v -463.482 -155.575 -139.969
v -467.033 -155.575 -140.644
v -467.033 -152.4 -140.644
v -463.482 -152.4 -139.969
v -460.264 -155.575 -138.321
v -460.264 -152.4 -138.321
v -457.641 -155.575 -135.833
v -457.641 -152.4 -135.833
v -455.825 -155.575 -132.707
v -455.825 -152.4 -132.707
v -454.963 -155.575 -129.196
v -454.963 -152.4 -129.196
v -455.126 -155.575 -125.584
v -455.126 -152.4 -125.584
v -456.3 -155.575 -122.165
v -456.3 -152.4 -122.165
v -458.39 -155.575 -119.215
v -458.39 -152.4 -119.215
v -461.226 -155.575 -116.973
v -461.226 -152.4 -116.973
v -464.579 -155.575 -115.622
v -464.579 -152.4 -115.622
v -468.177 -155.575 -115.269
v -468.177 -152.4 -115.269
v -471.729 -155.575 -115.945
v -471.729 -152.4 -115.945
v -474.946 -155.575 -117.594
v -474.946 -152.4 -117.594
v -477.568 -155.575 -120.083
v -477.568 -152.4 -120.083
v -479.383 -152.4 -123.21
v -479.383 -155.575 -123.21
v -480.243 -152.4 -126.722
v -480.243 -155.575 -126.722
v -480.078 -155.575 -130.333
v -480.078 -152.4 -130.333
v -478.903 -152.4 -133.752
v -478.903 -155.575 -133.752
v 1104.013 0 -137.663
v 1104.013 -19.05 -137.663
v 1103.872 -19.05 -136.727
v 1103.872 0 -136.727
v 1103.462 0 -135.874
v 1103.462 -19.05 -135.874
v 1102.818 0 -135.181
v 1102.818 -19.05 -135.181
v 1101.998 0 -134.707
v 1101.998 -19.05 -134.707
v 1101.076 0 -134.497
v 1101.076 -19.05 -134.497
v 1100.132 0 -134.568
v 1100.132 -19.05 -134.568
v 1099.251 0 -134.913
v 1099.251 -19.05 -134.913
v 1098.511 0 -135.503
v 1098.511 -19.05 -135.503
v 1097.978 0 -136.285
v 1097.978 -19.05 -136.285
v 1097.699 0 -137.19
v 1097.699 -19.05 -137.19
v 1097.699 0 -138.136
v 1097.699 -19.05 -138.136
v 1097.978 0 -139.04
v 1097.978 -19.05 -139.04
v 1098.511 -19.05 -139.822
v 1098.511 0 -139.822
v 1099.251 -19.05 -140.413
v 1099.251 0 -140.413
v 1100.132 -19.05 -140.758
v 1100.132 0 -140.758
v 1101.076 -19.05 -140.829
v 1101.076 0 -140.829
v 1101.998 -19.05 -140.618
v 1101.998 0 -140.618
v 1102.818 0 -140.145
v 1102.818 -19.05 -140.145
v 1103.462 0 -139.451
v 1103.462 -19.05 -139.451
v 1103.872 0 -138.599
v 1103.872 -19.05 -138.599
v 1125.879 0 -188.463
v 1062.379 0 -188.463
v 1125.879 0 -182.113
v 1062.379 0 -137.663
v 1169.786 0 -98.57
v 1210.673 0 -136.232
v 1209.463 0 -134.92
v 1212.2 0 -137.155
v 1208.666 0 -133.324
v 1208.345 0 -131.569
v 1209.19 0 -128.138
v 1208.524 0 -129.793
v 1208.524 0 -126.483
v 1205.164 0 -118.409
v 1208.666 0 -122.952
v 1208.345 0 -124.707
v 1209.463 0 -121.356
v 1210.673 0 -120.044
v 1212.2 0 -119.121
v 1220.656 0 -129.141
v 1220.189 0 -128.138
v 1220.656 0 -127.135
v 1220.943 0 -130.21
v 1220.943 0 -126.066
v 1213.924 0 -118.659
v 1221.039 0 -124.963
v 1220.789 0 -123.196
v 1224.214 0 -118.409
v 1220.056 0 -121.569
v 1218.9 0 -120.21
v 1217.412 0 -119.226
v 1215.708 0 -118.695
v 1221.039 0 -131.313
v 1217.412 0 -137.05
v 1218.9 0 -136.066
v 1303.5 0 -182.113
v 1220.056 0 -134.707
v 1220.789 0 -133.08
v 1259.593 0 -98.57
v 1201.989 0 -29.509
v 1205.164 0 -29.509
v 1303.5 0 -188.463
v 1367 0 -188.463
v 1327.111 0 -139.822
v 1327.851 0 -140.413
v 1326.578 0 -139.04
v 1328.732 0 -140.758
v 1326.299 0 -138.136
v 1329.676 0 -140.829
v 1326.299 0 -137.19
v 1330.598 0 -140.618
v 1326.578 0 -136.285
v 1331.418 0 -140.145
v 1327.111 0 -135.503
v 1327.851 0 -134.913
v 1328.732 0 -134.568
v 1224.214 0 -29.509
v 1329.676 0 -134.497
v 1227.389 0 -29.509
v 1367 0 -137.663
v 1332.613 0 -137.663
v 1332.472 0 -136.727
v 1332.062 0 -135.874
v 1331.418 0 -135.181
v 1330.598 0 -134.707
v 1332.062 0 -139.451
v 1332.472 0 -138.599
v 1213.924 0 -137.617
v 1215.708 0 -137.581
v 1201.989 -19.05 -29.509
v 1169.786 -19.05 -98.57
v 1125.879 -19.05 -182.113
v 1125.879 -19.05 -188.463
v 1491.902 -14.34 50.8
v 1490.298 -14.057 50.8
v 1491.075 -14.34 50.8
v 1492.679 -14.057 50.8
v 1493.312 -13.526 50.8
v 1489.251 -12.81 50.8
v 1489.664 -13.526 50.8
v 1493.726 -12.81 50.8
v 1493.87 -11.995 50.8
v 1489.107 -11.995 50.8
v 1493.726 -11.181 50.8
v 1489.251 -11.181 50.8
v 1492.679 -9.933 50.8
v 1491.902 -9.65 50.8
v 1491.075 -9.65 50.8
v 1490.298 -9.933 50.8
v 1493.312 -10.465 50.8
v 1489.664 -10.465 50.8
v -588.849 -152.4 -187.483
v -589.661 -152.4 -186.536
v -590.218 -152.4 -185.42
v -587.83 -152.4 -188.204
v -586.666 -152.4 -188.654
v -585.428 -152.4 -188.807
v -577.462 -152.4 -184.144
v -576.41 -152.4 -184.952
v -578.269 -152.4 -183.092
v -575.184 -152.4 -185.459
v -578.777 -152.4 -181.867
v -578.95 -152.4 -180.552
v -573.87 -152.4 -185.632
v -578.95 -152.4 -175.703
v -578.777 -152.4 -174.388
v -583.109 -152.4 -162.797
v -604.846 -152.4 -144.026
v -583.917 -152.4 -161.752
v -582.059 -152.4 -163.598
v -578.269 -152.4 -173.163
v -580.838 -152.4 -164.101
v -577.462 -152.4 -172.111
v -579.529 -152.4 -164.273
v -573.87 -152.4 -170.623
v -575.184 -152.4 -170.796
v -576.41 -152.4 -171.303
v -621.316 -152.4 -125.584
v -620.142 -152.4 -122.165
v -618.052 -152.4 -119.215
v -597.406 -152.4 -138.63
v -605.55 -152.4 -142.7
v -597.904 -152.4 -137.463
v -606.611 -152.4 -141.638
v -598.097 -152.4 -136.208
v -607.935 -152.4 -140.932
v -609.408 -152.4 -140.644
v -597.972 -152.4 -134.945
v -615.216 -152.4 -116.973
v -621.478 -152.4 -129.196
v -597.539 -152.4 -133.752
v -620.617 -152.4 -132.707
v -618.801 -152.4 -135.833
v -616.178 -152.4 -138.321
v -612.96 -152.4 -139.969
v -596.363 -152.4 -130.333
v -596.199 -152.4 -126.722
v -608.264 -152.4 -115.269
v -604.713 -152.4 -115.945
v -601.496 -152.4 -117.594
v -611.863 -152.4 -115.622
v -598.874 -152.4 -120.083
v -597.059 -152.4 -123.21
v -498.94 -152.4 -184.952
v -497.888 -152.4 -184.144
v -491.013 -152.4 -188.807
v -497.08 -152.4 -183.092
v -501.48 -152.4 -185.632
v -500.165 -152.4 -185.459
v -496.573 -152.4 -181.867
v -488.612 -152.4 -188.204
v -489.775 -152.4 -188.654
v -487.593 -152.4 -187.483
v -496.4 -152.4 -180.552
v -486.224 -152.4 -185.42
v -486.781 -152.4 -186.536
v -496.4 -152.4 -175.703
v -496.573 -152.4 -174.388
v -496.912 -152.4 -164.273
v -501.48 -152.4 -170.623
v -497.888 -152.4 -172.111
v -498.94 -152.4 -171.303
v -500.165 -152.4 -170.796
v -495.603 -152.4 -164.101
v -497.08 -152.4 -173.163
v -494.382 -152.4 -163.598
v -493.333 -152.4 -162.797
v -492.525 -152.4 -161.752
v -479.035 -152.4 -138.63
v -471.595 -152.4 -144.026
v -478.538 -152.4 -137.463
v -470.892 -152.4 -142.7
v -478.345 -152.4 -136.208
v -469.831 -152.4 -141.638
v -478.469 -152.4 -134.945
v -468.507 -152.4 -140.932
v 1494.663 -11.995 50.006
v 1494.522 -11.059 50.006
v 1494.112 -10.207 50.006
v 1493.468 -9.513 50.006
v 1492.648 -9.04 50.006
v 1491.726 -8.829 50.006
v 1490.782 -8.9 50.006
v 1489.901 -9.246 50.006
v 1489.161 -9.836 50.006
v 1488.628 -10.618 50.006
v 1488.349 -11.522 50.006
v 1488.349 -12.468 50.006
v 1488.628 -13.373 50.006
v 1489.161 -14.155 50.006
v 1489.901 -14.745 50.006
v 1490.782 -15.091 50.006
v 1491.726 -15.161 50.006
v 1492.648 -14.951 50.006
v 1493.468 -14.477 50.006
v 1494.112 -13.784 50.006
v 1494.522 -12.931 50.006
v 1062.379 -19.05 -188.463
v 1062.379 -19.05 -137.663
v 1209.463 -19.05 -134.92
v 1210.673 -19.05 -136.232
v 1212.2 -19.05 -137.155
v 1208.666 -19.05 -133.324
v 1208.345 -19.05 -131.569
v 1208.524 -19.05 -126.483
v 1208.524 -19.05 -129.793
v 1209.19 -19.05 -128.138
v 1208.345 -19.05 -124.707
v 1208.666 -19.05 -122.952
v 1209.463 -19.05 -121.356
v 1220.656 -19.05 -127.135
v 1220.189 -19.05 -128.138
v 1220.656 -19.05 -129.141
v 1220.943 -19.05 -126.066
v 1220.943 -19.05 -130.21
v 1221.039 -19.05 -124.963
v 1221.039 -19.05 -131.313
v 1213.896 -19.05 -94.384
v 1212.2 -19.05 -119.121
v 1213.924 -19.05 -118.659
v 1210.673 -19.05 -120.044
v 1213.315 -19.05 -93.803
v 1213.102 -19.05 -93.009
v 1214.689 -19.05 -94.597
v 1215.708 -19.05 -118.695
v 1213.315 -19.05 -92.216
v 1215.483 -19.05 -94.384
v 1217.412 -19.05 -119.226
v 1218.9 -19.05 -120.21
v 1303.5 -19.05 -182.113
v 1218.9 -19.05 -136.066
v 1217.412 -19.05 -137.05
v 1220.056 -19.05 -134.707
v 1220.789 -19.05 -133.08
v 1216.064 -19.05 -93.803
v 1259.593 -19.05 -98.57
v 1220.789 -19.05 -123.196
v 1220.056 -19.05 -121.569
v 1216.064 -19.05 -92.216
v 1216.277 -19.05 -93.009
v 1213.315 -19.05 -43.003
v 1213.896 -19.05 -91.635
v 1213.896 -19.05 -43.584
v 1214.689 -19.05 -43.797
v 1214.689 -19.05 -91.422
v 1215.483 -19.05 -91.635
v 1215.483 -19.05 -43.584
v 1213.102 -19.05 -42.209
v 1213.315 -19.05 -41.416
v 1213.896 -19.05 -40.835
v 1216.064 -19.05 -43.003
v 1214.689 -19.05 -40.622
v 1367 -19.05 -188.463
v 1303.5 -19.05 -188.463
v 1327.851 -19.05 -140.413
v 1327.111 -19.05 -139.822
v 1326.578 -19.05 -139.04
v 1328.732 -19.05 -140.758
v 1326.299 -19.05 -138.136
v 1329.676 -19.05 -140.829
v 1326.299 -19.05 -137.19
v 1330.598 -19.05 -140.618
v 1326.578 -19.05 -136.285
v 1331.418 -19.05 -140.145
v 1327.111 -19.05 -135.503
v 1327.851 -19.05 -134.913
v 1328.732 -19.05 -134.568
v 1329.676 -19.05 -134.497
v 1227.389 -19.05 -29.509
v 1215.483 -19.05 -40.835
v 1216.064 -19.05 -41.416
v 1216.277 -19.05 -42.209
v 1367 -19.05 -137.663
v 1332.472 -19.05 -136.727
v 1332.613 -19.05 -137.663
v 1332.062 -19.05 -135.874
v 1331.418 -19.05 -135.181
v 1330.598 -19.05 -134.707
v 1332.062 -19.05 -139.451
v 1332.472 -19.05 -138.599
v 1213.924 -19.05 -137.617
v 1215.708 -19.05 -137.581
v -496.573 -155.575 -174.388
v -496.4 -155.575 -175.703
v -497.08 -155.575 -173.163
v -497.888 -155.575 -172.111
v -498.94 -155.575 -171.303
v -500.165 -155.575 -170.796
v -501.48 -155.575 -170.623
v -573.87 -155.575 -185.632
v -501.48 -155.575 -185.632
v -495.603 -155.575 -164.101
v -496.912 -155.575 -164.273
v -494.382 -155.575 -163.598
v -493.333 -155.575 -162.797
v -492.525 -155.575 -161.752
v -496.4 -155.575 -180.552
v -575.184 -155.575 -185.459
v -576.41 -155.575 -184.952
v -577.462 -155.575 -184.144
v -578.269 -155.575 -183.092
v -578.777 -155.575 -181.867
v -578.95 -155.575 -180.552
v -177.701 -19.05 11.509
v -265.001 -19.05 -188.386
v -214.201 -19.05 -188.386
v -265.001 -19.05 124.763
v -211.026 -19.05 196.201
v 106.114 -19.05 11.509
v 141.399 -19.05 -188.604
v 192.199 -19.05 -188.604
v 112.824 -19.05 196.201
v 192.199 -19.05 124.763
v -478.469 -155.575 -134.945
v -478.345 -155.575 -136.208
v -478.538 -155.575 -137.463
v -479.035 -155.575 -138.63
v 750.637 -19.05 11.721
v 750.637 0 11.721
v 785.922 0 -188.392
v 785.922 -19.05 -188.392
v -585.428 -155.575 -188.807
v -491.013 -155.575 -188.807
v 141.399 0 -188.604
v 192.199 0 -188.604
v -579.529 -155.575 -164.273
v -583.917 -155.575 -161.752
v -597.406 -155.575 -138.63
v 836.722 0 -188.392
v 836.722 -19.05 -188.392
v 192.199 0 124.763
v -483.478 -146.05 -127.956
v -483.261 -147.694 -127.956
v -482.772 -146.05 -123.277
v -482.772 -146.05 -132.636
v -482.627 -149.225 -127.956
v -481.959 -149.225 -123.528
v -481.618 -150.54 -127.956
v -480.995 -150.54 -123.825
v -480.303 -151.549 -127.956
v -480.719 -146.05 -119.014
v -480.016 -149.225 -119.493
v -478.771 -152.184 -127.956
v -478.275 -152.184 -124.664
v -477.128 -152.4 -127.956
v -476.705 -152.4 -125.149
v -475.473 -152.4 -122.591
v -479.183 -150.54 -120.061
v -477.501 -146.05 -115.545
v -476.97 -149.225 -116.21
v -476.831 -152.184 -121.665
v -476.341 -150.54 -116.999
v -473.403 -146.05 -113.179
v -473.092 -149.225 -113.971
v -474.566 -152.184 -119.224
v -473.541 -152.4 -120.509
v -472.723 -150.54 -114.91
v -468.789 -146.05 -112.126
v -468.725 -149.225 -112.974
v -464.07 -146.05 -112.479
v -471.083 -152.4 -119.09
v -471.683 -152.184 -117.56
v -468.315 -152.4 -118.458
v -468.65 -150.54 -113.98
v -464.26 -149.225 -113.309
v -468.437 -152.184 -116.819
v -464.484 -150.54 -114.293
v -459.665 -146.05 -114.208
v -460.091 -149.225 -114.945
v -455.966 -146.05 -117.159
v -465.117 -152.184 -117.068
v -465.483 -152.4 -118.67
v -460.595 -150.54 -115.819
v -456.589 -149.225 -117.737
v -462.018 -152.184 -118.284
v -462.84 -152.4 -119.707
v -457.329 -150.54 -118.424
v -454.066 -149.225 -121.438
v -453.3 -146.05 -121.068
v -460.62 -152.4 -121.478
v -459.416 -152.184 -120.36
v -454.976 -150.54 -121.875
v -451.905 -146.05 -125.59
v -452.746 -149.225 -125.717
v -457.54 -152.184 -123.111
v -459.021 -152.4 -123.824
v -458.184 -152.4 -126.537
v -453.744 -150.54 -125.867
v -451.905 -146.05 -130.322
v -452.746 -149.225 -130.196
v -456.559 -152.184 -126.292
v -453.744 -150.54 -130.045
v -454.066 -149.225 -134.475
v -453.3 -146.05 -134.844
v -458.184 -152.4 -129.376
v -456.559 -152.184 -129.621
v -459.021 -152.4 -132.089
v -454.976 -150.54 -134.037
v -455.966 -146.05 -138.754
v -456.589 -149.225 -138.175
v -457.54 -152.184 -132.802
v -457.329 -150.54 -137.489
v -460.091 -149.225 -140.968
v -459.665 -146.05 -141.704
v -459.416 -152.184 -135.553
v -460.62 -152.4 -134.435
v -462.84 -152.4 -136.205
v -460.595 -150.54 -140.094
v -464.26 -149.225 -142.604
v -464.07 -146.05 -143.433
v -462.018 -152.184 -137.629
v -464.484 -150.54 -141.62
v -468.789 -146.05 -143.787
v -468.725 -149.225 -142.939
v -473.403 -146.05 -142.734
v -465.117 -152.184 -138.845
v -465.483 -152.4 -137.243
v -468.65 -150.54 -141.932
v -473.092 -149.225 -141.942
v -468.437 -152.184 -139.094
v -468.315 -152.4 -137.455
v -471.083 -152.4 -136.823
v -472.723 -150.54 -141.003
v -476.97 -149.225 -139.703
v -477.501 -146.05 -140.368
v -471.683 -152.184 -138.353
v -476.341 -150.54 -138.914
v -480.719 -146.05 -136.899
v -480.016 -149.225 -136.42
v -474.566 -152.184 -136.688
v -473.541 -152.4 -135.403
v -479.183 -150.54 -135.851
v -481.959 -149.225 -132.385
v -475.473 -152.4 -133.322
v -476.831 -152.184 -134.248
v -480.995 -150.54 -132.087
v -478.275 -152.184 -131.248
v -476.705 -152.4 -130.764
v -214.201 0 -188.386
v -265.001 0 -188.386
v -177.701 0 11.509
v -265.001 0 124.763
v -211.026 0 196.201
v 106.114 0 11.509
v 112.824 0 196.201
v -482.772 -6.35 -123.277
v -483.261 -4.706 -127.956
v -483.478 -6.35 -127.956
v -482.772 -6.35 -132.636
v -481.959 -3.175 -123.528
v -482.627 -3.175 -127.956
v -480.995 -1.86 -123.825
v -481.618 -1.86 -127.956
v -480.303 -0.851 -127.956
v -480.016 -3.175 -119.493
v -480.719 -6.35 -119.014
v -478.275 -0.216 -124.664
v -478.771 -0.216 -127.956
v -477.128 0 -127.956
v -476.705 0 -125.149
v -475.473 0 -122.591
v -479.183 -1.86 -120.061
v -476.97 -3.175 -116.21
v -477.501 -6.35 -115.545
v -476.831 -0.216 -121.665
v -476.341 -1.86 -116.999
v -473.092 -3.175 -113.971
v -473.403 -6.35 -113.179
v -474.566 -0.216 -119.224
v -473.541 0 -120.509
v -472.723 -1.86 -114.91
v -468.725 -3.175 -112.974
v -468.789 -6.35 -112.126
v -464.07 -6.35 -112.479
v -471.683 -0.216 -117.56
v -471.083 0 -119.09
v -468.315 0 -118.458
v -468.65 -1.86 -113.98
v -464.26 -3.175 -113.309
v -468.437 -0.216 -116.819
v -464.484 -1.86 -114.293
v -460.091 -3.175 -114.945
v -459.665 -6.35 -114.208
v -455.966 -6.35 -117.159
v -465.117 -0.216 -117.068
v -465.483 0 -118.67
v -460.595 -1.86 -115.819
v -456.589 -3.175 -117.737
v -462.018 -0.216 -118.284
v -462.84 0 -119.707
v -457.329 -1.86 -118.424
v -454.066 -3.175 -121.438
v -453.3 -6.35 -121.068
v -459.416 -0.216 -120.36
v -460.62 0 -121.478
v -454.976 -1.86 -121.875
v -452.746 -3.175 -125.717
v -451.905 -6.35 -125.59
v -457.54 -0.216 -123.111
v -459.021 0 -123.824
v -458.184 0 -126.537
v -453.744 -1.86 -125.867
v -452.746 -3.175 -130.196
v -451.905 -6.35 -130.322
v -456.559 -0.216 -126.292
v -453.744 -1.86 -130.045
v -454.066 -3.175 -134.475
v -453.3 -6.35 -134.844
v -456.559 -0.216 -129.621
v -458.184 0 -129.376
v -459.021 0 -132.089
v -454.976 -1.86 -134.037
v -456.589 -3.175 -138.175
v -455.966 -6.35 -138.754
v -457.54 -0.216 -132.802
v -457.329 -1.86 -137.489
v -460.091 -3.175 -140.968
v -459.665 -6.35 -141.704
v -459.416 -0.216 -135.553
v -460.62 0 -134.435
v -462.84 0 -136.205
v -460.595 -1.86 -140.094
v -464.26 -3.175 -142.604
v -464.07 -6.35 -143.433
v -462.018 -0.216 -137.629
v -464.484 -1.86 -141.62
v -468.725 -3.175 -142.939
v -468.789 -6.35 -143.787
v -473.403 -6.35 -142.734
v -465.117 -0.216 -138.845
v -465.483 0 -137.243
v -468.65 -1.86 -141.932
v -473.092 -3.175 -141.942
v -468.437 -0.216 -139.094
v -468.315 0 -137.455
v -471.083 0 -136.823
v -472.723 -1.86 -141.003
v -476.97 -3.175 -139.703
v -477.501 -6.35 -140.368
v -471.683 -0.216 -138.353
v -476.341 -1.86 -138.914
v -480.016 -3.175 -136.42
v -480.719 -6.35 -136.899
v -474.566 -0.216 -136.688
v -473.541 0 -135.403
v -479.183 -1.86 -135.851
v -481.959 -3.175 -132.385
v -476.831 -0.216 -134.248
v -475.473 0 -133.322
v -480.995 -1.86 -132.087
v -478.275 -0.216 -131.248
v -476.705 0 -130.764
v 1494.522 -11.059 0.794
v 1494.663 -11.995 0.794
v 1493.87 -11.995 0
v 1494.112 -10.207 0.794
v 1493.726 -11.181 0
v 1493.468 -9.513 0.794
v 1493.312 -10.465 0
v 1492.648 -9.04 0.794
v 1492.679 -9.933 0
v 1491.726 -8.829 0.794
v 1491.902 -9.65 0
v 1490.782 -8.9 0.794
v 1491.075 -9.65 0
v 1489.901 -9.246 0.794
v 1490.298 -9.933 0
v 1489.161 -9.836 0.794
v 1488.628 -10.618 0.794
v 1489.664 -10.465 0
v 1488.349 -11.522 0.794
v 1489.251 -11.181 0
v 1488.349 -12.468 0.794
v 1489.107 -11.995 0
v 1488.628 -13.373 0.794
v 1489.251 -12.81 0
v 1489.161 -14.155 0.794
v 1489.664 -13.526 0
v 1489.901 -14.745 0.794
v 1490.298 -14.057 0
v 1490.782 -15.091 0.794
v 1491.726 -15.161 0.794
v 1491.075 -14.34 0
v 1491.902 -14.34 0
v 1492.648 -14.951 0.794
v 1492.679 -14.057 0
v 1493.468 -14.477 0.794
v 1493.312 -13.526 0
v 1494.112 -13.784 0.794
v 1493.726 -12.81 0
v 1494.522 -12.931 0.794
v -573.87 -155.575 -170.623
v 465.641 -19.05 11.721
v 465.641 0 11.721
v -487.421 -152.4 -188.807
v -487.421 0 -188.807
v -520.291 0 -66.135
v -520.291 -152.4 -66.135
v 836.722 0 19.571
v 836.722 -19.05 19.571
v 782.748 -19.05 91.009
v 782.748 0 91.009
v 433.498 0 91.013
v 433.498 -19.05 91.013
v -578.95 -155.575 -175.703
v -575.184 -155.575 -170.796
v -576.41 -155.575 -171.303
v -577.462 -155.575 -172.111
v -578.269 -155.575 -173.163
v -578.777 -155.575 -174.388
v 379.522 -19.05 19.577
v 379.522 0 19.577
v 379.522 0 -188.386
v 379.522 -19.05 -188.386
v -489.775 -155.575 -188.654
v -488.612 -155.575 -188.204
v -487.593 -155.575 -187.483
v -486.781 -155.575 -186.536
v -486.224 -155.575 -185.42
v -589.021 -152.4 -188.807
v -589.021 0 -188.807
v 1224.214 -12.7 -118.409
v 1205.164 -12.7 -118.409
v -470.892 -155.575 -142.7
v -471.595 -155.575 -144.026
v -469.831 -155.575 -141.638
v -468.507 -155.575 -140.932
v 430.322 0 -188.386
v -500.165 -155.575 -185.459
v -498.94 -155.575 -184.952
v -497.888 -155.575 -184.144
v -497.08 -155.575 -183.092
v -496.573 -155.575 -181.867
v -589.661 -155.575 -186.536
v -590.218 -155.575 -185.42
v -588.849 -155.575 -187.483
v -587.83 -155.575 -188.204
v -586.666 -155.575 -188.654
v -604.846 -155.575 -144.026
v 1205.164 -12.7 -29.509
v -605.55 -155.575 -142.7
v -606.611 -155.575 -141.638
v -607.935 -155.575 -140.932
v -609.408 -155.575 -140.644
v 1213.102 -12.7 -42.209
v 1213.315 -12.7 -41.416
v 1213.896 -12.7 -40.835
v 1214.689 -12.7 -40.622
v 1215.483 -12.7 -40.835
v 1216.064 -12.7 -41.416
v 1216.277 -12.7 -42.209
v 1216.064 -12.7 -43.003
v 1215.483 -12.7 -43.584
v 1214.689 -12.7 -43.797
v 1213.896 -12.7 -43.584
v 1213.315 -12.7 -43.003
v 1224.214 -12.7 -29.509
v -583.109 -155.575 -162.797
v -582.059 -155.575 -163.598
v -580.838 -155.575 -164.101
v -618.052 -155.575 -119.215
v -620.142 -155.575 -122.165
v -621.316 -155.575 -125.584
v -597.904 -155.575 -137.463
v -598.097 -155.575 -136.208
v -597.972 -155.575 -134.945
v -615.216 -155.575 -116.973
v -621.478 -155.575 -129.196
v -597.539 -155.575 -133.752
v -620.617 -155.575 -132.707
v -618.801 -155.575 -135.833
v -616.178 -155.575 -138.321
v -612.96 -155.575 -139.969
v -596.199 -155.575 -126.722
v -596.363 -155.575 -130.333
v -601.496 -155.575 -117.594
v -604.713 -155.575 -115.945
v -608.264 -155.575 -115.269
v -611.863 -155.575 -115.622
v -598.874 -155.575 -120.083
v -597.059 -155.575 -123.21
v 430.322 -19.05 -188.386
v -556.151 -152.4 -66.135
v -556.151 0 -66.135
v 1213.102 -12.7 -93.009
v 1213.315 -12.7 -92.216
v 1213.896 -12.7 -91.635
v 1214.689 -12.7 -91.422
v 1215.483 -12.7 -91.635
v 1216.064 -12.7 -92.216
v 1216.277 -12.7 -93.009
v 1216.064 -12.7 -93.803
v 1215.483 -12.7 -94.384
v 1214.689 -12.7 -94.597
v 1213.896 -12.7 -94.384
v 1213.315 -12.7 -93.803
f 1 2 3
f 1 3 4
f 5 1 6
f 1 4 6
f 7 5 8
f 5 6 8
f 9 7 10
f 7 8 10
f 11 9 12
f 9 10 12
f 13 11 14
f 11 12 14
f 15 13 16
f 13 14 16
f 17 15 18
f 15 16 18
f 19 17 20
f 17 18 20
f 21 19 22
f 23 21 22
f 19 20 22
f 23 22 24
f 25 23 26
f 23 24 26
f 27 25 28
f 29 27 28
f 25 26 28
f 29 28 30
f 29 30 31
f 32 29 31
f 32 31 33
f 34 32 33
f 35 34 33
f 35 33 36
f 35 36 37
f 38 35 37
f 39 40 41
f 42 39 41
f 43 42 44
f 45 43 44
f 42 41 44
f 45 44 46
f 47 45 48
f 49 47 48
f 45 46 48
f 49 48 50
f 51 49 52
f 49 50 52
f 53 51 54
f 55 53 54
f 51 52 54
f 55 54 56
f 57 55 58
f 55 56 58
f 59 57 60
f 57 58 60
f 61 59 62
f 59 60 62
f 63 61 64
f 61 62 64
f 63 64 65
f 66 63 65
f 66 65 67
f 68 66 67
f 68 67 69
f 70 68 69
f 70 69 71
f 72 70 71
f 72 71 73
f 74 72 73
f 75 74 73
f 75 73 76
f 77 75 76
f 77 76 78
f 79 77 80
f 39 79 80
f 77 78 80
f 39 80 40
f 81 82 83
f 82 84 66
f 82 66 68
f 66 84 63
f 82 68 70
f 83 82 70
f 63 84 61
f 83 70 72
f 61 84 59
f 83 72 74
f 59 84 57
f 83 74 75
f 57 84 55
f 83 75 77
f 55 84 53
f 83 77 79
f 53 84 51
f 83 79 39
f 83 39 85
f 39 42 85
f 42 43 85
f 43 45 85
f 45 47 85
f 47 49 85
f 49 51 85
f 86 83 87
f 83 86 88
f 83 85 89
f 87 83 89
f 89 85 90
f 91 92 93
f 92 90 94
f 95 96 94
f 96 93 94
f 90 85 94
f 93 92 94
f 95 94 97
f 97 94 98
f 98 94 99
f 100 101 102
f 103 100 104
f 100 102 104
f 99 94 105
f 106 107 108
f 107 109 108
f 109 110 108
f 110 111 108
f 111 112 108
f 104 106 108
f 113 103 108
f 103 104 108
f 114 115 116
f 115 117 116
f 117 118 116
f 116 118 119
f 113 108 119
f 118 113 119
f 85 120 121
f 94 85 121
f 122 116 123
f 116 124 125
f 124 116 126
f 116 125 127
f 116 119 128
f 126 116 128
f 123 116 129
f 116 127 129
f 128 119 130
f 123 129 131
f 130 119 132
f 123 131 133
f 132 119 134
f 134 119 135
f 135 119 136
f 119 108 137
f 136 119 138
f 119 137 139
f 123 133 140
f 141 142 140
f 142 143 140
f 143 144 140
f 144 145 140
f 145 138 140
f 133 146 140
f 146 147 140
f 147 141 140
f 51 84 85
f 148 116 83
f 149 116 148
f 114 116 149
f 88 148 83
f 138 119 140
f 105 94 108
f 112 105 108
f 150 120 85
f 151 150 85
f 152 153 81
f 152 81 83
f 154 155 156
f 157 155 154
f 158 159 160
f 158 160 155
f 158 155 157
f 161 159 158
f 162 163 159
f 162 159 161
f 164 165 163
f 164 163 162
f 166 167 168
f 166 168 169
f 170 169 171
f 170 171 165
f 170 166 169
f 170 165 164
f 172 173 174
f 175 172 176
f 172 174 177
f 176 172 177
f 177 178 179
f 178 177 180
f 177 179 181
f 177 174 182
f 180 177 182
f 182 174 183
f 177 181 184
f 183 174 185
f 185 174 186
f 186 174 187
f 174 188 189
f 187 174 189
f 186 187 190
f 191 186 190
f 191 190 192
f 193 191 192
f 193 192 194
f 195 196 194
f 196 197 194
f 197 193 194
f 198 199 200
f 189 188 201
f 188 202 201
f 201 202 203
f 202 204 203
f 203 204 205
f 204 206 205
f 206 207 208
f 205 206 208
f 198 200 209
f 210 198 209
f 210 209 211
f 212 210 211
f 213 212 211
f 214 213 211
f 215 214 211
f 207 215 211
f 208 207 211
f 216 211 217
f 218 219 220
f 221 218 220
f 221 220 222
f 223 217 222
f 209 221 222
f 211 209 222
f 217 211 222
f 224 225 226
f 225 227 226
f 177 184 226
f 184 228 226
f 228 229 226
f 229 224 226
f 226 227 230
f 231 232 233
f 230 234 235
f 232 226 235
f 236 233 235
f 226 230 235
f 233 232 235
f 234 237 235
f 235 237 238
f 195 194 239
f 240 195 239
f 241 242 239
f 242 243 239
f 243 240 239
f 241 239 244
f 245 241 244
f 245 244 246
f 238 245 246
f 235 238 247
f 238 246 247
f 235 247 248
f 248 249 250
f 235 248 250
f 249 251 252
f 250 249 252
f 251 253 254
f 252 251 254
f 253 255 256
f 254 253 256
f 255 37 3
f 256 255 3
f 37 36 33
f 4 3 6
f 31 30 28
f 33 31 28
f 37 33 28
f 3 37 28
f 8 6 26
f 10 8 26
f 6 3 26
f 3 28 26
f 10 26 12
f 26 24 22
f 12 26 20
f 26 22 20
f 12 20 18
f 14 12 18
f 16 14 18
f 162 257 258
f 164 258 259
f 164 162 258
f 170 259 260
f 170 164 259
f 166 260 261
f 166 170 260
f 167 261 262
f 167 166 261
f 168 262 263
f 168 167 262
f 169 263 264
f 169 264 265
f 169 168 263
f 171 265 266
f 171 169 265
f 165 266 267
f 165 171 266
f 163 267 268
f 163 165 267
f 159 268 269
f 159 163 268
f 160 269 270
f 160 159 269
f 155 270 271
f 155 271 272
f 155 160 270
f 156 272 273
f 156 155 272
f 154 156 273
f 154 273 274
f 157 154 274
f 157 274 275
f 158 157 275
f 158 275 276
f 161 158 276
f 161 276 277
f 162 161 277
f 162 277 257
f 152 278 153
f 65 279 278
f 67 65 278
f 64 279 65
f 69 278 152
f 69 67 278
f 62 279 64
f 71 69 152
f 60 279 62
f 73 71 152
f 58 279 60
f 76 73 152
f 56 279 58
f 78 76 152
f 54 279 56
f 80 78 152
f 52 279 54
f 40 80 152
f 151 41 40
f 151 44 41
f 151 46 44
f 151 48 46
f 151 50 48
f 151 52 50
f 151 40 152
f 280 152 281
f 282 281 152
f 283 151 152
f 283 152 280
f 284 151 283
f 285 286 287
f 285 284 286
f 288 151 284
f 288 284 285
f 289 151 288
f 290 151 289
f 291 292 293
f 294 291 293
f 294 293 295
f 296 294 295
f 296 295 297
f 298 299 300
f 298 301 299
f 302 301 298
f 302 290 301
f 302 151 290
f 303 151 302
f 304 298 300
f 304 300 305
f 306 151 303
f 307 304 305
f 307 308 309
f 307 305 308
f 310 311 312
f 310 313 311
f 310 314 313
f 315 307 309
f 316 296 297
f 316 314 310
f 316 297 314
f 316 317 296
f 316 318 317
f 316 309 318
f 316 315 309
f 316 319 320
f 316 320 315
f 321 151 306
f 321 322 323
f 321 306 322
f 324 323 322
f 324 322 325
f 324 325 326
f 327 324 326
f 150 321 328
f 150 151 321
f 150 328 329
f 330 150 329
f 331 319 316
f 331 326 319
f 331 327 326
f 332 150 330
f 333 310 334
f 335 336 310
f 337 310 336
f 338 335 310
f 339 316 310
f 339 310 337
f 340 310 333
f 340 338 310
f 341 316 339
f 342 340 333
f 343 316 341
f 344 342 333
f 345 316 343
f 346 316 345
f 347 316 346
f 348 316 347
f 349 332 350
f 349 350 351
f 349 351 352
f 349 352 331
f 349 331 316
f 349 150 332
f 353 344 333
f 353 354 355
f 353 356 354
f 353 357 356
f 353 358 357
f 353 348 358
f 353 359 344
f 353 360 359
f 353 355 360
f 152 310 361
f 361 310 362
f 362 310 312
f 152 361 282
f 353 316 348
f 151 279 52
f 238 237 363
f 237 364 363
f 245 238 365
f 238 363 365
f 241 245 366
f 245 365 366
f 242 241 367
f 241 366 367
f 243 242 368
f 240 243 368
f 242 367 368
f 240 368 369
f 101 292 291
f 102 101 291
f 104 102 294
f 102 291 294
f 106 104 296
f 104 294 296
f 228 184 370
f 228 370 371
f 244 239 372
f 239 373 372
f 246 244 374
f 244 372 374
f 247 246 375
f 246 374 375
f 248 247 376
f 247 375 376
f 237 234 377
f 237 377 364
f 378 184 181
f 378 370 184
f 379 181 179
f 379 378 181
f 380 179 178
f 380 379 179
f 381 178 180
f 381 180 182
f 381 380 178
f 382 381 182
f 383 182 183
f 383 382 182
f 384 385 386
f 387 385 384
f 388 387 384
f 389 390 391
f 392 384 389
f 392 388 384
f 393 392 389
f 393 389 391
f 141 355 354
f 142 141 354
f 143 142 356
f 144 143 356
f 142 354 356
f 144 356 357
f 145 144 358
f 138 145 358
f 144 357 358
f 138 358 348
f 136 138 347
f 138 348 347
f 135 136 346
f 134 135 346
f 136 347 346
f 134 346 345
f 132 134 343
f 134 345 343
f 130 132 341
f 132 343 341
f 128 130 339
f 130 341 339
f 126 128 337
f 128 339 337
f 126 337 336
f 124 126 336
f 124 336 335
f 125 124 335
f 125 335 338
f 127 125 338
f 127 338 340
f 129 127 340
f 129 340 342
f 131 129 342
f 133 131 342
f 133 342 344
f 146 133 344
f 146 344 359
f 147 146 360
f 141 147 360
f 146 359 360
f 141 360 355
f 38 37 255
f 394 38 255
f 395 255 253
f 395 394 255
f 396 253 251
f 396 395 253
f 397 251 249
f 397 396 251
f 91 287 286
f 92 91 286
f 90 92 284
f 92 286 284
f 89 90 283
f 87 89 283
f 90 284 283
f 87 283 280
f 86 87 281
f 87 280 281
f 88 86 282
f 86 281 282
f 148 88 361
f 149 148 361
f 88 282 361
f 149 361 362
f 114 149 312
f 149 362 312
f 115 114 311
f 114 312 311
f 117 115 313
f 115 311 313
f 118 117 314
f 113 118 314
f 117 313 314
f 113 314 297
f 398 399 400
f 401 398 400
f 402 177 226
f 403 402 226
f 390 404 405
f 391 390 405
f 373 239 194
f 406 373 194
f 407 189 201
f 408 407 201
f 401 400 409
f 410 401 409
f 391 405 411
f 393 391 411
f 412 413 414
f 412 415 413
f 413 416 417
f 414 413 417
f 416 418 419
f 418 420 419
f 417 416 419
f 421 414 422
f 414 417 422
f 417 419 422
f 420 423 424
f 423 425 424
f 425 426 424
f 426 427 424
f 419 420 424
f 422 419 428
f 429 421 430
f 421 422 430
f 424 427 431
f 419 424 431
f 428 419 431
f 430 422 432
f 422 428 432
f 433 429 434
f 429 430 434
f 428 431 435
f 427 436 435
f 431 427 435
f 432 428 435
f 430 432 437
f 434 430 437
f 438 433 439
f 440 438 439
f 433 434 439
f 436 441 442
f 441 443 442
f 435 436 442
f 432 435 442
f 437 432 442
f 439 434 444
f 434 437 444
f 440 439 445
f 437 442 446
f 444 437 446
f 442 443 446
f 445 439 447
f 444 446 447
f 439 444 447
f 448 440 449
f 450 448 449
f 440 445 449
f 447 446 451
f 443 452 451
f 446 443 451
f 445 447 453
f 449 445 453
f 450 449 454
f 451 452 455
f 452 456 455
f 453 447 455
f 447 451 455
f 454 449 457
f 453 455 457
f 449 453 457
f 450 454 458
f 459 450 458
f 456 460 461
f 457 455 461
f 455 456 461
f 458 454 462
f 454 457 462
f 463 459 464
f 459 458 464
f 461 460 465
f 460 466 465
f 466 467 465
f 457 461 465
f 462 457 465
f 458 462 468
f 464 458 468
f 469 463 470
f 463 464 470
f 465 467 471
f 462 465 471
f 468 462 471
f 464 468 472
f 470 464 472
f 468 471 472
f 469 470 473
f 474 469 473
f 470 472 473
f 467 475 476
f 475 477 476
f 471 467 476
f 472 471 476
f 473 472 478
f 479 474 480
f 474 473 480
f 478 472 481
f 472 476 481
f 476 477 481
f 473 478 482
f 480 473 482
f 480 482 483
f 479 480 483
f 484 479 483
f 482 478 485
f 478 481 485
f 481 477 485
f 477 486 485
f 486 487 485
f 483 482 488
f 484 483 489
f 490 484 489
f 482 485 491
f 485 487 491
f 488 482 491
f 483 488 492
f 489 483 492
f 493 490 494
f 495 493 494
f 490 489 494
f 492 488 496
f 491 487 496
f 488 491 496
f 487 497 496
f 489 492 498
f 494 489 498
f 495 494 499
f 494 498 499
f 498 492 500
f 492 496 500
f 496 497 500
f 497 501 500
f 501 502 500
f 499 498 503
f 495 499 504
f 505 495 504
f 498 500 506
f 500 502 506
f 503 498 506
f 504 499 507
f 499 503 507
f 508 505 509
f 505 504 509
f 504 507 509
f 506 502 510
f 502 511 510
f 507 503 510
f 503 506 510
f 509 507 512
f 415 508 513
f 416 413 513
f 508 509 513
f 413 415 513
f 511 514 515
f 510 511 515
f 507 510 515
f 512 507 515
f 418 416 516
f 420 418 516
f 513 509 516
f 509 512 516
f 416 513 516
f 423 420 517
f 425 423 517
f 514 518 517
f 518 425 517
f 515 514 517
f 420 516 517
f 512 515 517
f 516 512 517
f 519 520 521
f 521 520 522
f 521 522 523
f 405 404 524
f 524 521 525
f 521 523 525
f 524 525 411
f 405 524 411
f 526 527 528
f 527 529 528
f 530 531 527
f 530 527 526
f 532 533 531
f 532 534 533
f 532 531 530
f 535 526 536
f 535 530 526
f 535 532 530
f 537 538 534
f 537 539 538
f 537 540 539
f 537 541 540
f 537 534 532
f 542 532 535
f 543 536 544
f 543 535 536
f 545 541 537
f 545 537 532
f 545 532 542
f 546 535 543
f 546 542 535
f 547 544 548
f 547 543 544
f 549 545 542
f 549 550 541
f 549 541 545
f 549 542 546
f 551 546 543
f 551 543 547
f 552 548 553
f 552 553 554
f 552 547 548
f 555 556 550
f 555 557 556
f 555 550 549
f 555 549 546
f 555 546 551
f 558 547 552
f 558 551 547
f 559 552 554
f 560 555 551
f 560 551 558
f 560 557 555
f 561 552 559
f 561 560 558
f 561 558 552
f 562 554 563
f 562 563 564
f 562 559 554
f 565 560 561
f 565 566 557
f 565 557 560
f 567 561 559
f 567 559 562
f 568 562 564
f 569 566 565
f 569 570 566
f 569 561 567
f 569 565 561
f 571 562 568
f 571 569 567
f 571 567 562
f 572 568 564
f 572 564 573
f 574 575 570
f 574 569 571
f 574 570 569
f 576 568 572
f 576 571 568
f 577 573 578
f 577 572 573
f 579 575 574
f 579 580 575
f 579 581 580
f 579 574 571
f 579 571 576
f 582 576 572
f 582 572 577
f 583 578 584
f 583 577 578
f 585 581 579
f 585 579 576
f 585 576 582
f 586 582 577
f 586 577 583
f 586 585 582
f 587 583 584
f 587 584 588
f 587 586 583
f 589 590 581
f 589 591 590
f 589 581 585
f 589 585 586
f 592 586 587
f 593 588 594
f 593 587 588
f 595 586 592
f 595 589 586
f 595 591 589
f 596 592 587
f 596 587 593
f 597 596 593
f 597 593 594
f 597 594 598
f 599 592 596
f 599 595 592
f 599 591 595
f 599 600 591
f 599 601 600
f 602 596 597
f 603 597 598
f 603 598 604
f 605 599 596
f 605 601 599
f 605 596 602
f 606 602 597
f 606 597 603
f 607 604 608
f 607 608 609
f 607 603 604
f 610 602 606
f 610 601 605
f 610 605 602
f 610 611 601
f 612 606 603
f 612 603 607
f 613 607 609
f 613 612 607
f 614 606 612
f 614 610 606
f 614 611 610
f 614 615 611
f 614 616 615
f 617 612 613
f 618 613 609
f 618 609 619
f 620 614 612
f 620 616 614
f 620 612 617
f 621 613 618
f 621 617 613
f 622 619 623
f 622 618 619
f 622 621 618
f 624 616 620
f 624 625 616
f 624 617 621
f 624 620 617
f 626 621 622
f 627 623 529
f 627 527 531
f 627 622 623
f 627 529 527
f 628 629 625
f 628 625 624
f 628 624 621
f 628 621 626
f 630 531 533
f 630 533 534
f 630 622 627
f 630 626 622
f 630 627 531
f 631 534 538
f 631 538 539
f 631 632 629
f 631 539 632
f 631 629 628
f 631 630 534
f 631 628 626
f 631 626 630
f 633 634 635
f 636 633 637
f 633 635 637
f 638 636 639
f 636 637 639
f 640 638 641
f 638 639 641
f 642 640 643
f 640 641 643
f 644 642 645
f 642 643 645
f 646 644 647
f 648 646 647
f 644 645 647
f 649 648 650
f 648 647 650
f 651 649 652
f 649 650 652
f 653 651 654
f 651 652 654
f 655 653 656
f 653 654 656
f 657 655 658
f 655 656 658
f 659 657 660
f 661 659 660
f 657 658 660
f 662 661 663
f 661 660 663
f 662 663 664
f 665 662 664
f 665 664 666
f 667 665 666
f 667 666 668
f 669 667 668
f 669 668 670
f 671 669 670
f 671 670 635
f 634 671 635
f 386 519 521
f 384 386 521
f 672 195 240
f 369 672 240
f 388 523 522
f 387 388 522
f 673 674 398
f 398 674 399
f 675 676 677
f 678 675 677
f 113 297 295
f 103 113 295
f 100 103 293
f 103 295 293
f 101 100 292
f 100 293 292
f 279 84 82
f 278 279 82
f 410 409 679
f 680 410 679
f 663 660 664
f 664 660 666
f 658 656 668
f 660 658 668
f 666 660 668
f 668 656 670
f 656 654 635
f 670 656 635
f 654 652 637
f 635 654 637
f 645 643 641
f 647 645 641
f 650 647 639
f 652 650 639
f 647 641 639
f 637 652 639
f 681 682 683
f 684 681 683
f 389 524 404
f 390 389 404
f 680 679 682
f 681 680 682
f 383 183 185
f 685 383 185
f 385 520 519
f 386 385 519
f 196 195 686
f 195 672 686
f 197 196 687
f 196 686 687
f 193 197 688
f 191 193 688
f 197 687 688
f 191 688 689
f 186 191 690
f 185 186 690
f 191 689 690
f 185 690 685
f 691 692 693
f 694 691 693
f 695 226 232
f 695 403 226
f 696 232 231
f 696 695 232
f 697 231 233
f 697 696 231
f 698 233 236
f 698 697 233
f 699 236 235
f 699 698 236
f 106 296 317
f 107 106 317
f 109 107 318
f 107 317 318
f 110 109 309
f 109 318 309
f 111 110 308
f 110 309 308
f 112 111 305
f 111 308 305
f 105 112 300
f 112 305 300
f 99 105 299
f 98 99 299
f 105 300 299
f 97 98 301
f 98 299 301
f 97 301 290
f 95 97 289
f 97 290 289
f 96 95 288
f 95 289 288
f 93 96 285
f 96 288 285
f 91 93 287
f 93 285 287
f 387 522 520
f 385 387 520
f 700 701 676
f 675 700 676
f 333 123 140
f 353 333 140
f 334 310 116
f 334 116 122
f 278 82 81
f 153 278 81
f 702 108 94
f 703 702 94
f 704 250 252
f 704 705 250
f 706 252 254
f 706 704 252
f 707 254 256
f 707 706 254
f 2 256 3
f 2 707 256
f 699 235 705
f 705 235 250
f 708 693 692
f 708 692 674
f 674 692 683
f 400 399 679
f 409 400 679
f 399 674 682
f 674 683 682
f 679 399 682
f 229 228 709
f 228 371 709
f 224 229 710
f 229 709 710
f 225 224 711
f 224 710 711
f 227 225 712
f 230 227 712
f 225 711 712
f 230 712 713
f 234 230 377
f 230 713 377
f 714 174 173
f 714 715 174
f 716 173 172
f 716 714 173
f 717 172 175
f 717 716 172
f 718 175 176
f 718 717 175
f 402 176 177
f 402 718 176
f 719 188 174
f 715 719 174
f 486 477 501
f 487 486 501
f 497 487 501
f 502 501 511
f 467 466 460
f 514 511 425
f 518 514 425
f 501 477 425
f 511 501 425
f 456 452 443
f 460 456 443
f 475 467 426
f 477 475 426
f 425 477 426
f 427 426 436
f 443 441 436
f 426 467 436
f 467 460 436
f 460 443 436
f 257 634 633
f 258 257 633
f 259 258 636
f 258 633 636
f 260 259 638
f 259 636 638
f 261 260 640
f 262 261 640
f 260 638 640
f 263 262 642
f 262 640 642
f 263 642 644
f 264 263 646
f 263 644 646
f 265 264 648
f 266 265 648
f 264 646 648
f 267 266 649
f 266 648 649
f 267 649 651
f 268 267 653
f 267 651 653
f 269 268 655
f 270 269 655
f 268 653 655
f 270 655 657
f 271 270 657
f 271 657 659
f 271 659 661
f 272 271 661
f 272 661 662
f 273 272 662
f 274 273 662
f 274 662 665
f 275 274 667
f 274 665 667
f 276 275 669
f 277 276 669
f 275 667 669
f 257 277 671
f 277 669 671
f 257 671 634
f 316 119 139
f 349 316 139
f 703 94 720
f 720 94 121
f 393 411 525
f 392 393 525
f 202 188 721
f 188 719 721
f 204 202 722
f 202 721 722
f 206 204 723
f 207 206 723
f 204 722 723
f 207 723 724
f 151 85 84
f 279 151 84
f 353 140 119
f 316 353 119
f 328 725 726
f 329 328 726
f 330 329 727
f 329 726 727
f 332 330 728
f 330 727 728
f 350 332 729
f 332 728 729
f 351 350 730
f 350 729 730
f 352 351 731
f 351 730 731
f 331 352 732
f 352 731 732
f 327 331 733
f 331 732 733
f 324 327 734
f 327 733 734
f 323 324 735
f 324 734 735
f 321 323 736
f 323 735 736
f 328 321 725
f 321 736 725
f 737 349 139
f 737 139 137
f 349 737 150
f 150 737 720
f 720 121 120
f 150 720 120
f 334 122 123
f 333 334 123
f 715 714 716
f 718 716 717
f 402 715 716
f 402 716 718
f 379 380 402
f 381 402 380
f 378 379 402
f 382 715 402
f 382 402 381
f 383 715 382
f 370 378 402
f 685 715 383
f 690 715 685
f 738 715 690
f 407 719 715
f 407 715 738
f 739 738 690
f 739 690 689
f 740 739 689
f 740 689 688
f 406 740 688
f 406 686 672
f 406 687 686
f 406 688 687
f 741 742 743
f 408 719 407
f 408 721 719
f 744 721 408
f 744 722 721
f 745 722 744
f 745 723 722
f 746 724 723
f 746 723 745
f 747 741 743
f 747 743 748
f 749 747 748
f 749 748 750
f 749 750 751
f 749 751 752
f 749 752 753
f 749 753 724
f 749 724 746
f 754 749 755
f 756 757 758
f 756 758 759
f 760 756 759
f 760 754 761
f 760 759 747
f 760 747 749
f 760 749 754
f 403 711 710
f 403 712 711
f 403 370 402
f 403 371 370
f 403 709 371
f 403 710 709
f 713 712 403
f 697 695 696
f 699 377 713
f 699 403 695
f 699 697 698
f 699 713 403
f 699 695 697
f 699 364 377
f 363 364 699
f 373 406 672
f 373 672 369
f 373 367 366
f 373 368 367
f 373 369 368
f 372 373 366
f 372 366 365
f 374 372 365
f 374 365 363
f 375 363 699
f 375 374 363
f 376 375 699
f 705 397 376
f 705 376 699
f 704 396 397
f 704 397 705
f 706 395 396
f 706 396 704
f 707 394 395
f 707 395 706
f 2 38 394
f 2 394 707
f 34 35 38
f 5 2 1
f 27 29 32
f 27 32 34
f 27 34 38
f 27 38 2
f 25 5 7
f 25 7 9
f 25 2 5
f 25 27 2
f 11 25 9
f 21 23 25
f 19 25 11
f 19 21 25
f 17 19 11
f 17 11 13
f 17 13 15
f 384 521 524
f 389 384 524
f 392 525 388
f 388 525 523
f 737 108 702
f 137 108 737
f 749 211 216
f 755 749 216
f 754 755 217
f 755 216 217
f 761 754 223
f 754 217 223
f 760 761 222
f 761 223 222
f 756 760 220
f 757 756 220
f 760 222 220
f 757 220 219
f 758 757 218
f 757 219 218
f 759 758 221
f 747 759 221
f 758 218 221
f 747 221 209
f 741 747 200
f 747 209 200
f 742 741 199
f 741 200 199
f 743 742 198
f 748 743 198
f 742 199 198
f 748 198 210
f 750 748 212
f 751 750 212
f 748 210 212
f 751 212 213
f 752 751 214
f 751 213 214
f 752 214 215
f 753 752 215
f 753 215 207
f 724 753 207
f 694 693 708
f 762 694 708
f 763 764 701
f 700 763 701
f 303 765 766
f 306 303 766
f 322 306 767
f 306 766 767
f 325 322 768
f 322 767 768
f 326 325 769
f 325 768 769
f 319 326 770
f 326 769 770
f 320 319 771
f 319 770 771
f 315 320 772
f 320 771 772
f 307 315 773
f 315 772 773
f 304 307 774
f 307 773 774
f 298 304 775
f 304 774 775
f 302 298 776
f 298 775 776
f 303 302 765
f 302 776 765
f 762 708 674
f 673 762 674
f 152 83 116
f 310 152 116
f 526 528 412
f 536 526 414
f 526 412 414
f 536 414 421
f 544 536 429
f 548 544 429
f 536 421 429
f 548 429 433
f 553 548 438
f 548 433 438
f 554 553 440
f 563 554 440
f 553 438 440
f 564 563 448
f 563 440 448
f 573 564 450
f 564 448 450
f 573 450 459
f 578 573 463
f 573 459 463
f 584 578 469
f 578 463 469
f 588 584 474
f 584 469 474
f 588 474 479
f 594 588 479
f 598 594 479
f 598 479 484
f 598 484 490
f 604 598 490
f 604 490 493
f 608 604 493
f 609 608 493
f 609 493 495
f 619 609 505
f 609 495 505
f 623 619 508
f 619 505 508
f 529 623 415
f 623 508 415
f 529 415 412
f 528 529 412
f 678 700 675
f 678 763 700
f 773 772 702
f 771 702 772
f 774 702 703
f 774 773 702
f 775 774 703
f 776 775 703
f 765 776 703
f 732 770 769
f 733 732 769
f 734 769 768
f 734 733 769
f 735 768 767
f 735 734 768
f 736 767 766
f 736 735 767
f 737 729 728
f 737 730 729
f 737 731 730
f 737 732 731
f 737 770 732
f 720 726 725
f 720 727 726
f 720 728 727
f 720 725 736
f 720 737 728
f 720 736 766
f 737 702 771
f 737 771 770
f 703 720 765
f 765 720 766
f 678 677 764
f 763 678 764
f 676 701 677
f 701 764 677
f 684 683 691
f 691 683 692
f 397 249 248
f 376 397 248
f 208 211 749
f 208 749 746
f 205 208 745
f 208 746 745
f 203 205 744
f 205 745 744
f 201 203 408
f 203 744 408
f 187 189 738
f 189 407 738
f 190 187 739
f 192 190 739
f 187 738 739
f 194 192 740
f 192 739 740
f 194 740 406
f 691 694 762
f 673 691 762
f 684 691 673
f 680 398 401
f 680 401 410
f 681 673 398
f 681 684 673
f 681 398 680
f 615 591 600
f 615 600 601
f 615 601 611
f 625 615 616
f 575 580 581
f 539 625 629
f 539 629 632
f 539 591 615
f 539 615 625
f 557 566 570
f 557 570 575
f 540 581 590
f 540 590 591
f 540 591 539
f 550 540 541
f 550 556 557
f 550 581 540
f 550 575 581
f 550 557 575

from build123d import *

# Parameters (mm, degrees)
F1_DEPTH  = 19.05
F2_R      = 3.175
F3_DEPTH  = 19.05
F4_W      = 19.05
F4_H      = 88.9
F5_DEPTH  = 12.7
F6_R      = 1.5875
F7_DEPTH  = 6.35
F8_R      = 3.175
F9_DEPTH  = 50.8
F10_SIZE  = 0.79375
F12_DEPTH = 152.4
F13_W     = 82.55
F13_H     = 15.0095159877
F14_DEPTH = 3.175
F15_R     = 5.08
F16_R     = 15.875
F17_DEPTH = 152.4
F18_R     = 6.35


# Not quite as in the source:
# - a feature names something its author has since deleted; it is built from what else it names


with BuildPart() as f1:
    # F0 (on Front) → F1 (new body)
    with BuildSketch(Plane.XZ):
        Polygon((106.1141828492, 11.5090513026), (141.3994925511, -188.6038841095), (192.1994925511, -188.6038841095), (192.1994925511, 124.7630377858), (112.8244925511, 196.2005377858), (-211.0255074489, 196.2005377858), (-265.0005074489, 124.7630377858), (-265.0005074489, -188.3859314735), (-214.2005074489, -188.3859314735), (-177.7007011349, 11.5090513026), align=None)
    extrude(amount=F1_DEPTH)


with BuildPart() as f1b:
    # F0 (on Front) → F1, piece 2 (new body)
    with BuildSketch(Plane.XZ):
        Polygon((750.637189092, 11.7211622333), (785.922498794, -188.3917731787), (836.722498794, -188.3917731787), (836.722498794, 19.5707268213), (782.7483080176, 91.0088382275), (433.4982512736, 91.0127944155), (379.522498794, 19.5765685265), (379.522498794, -188.3859314735), (430.322498794, -188.3859314735), (465.6409224309, 11.7211622333), align=None)
    extrude(amount=F1_DEPTH)


with BuildPart() as f1c:
    # F0 (on Front) → F1, piece 3 (new body)
    with BuildSketch(Plane.XZ):
        Polygon((1062.3789626762, -137.6629166841), (1062.3789626762, -188.4629166841), (1125.8789626762, -188.4629166841), (1125.8789626762, -182.1129166841), (1303.4997188771, -182.1129166841), (1303.4997188771, -188.4629166841), (1366.9997188771, -188.4629166841), (1366.9997188771, -137.6629166841), (1259.5928523213, -98.570014302), (1227.3893407766, -29.5093609298), (1201.9893407766, -29.5093609298), (1169.785829232, -98.570014302), align=None)
    extrude(amount=F1_DEPTH)

    # F2 (on face) → F3 (cut, through all)
    with BuildSketch(Plane.XZ.offset(19.05)):
        with Locations((1100.8384227753, -137.6629166841)):
            Circle(F2_R)
        with Locations((1329.4384227753, -137.6629166841)):
            Circle(F2_R)
        with BuildLine():
            ThreePointArc((1209.190112656, -128.1379166841), (1213.0458730336, -137.446545681), (1221.03937397, -131.3129166841))
            ThreePointArc((1221.03937397, -131.3129166841), (1220.823002967, -129.6694157477), (1220.1886352841, -128.1379166841))
            ThreePointArc((1220.1886352841, -128.1379166841), (1214.68937397, -131.3129166841), (1209.190112656, -128.1379166841))
        make_face()
        with BuildLine():
            ThreePointArc((1209.190112656, -128.1379166841), (1214.68937397, -131.3129166841), (1220.1886352841, -128.1379166841))
            ThreePointArc((1220.1886352841, -128.1379166841), (1214.68937397, -124.9629166841), (1209.190112656, -128.1379166841))
        make_face()
        with BuildLine():
            ThreePointArc((1209.190112656, -128.1379166841), (1214.68937397, -124.9629166841), (1220.1886352841, -128.1379166841))
            ThreePointArc((1220.1886352841, -128.1379166841), (1220.823002967, -126.6064176205), (1221.03937397, -124.9629166841))
            ThreePointArc((1221.03937397, -124.9629166841), (1213.0458730336, -118.8292876871), (1209.190112656, -128.1379166841))
        make_face()
    extrude(amount=-F3_DEPTH, mode=Mode.SUBTRACT)

    # F4 (on face) → F5 (cut)
    with BuildSketch(Plane(origin=(0, 0, 0), x_dir=(-1, 0, 0), z_dir=(0, 1, 0))):
        with Locations((-1214.6893407766, -73.9593609298)):
            Rectangle(F4_W, F4_H)
    extrude(amount=-F5_DEPTH, mode=Mode.SUBTRACT)

    # F6 (on face) → F7 (cut, through all)
    with BuildSketch(Plane(origin=(0, -12.7, 0), x_dir=(-1, 0, 0), z_dir=(0, 1, 0))):
        with Locations((-1214.6893407766, -42.2093609298)):
            Circle(F6_R)
        with Locations((-1214.6893407766, -93.0093609298)):
            Circle(F6_R)
    extrude(amount=-F7_DEPTH, mode=Mode.SUBTRACT)


with BuildPart() as f9:
    # F8 (on Top) → F9 (new body)
    with BuildSketch(Plane.XY):
        with Locations((1491.4883375168, -11.9951693341)):
            Circle(F8_R)
    extrude(amount=F9_DEPTH)

    # F10
    f10_edges = [f9.edges().sort_by_distance(p)[0] for p in [
        (1488.313338, -11.995169, 50.8),
        (1488.313338, -11.995169, 0),
    ]]
    chamfer(f10_edges, length=F10_SIZE)


with BuildPart() as f12:
    # F11 (on Front) → F12 (new body)
    with BuildSketch(Plane.XZ):
        Polygon((-589.0208482742, -188.8071298599), (-487.4208482742, -188.8071298599), (-520.2908670023, -66.1345499212), (-556.1508295462, -66.1345499212), align=None)
    extrude(amount=F12_DEPTH)


with BuildPart() as f14:
    # F13 (on face) → F14 (new body)
    with BuildSketch(Plane.XZ.offset(152.4)):
        with BuildLine():
            Line((-606.1395994957, -140.3661550864), (-589.0208482742, -188.8071298599))
            Line((-589.0208482742, -188.8071298599), (-487.4208482742, -188.8071298599))
            Line((-487.4208482742, -188.8071298599), (-470.3020970528, -140.3661550864))
            ThreePointArc((-470.3020970528, -140.3661550864), (-460.941969274, -117.143187727), (-477.4715221366, -135.9498909781))
            Line((-477.4715221366, -135.9498909781), (-493.9948520198, -164.2726138722))
            Line((-493.9948520198, -164.2726138722), (-582.4468445286, -164.2726138722))
            Line((-582.4468445286, -164.2726138722), (-598.9701744119, -135.9498909781))
            ThreePointArc((-598.9701744119, -135.9498909781), (-615.4997272745, -117.143187727), (-606.1395994957, -140.3661550864))
        make_face()
        with Locations((-537.6746112347, -178.1273718661)):
            Rectangle(F13_W, F13_H, mode=Mode.SUBTRACT)
    extrude(amount=F14_DEPTH)

    # F15
    f15_edges = [f14.edges().sort_by_distance(p)[0] for p in [
        (-598.970174, -153.9875, -135.949891),
        (-606.139599, -153.9875, -140.366155),
        (-582.446845, -153.9875, -164.272614),
        (-589.020848, -153.9875, -188.80713),
        (-578.949611, -153.9875, -170.622614),
        (-578.949611, -153.9875, -185.63213),
        (-496.399611, -153.9875, -170.622614),
        (-496.399611, -153.9875, -185.63213),
        (-493.994852, -153.9875, -164.272614),
        (-487.420848, -153.9875, -188.80713),
        (-470.302097, -153.9875, -140.366155),
        (-477.471522, -153.9875, -135.949891),
    ]]
    fillet(f15_edges, radius=F15_R)


with BuildPart() as f17:
    # F16 (on face) → F17 (new body)
    with BuildSketch(Plane(origin=(0, -152.4, 0), x_dir=(-1, 0, 0), z_dir=(0, 1, 0))):
        with Locations((467.6027211189, -127.9563456774)):
            Circle(F16_R)
    extrude(amount=F17_DEPTH)

    # F18
    f18_edges = [f17.edges().sort_by_distance(p)[0] for p in [
        (-451.727721, -152.4, -127.956346),
        (-451.727721, 0, -127.956346),
    ]]
    fillet(f18_edges, radius=F18_R)


solid = Compound([f1.part, f1b.part, f1c.part, f9.part, f12.part, f14.part, f17.part])
